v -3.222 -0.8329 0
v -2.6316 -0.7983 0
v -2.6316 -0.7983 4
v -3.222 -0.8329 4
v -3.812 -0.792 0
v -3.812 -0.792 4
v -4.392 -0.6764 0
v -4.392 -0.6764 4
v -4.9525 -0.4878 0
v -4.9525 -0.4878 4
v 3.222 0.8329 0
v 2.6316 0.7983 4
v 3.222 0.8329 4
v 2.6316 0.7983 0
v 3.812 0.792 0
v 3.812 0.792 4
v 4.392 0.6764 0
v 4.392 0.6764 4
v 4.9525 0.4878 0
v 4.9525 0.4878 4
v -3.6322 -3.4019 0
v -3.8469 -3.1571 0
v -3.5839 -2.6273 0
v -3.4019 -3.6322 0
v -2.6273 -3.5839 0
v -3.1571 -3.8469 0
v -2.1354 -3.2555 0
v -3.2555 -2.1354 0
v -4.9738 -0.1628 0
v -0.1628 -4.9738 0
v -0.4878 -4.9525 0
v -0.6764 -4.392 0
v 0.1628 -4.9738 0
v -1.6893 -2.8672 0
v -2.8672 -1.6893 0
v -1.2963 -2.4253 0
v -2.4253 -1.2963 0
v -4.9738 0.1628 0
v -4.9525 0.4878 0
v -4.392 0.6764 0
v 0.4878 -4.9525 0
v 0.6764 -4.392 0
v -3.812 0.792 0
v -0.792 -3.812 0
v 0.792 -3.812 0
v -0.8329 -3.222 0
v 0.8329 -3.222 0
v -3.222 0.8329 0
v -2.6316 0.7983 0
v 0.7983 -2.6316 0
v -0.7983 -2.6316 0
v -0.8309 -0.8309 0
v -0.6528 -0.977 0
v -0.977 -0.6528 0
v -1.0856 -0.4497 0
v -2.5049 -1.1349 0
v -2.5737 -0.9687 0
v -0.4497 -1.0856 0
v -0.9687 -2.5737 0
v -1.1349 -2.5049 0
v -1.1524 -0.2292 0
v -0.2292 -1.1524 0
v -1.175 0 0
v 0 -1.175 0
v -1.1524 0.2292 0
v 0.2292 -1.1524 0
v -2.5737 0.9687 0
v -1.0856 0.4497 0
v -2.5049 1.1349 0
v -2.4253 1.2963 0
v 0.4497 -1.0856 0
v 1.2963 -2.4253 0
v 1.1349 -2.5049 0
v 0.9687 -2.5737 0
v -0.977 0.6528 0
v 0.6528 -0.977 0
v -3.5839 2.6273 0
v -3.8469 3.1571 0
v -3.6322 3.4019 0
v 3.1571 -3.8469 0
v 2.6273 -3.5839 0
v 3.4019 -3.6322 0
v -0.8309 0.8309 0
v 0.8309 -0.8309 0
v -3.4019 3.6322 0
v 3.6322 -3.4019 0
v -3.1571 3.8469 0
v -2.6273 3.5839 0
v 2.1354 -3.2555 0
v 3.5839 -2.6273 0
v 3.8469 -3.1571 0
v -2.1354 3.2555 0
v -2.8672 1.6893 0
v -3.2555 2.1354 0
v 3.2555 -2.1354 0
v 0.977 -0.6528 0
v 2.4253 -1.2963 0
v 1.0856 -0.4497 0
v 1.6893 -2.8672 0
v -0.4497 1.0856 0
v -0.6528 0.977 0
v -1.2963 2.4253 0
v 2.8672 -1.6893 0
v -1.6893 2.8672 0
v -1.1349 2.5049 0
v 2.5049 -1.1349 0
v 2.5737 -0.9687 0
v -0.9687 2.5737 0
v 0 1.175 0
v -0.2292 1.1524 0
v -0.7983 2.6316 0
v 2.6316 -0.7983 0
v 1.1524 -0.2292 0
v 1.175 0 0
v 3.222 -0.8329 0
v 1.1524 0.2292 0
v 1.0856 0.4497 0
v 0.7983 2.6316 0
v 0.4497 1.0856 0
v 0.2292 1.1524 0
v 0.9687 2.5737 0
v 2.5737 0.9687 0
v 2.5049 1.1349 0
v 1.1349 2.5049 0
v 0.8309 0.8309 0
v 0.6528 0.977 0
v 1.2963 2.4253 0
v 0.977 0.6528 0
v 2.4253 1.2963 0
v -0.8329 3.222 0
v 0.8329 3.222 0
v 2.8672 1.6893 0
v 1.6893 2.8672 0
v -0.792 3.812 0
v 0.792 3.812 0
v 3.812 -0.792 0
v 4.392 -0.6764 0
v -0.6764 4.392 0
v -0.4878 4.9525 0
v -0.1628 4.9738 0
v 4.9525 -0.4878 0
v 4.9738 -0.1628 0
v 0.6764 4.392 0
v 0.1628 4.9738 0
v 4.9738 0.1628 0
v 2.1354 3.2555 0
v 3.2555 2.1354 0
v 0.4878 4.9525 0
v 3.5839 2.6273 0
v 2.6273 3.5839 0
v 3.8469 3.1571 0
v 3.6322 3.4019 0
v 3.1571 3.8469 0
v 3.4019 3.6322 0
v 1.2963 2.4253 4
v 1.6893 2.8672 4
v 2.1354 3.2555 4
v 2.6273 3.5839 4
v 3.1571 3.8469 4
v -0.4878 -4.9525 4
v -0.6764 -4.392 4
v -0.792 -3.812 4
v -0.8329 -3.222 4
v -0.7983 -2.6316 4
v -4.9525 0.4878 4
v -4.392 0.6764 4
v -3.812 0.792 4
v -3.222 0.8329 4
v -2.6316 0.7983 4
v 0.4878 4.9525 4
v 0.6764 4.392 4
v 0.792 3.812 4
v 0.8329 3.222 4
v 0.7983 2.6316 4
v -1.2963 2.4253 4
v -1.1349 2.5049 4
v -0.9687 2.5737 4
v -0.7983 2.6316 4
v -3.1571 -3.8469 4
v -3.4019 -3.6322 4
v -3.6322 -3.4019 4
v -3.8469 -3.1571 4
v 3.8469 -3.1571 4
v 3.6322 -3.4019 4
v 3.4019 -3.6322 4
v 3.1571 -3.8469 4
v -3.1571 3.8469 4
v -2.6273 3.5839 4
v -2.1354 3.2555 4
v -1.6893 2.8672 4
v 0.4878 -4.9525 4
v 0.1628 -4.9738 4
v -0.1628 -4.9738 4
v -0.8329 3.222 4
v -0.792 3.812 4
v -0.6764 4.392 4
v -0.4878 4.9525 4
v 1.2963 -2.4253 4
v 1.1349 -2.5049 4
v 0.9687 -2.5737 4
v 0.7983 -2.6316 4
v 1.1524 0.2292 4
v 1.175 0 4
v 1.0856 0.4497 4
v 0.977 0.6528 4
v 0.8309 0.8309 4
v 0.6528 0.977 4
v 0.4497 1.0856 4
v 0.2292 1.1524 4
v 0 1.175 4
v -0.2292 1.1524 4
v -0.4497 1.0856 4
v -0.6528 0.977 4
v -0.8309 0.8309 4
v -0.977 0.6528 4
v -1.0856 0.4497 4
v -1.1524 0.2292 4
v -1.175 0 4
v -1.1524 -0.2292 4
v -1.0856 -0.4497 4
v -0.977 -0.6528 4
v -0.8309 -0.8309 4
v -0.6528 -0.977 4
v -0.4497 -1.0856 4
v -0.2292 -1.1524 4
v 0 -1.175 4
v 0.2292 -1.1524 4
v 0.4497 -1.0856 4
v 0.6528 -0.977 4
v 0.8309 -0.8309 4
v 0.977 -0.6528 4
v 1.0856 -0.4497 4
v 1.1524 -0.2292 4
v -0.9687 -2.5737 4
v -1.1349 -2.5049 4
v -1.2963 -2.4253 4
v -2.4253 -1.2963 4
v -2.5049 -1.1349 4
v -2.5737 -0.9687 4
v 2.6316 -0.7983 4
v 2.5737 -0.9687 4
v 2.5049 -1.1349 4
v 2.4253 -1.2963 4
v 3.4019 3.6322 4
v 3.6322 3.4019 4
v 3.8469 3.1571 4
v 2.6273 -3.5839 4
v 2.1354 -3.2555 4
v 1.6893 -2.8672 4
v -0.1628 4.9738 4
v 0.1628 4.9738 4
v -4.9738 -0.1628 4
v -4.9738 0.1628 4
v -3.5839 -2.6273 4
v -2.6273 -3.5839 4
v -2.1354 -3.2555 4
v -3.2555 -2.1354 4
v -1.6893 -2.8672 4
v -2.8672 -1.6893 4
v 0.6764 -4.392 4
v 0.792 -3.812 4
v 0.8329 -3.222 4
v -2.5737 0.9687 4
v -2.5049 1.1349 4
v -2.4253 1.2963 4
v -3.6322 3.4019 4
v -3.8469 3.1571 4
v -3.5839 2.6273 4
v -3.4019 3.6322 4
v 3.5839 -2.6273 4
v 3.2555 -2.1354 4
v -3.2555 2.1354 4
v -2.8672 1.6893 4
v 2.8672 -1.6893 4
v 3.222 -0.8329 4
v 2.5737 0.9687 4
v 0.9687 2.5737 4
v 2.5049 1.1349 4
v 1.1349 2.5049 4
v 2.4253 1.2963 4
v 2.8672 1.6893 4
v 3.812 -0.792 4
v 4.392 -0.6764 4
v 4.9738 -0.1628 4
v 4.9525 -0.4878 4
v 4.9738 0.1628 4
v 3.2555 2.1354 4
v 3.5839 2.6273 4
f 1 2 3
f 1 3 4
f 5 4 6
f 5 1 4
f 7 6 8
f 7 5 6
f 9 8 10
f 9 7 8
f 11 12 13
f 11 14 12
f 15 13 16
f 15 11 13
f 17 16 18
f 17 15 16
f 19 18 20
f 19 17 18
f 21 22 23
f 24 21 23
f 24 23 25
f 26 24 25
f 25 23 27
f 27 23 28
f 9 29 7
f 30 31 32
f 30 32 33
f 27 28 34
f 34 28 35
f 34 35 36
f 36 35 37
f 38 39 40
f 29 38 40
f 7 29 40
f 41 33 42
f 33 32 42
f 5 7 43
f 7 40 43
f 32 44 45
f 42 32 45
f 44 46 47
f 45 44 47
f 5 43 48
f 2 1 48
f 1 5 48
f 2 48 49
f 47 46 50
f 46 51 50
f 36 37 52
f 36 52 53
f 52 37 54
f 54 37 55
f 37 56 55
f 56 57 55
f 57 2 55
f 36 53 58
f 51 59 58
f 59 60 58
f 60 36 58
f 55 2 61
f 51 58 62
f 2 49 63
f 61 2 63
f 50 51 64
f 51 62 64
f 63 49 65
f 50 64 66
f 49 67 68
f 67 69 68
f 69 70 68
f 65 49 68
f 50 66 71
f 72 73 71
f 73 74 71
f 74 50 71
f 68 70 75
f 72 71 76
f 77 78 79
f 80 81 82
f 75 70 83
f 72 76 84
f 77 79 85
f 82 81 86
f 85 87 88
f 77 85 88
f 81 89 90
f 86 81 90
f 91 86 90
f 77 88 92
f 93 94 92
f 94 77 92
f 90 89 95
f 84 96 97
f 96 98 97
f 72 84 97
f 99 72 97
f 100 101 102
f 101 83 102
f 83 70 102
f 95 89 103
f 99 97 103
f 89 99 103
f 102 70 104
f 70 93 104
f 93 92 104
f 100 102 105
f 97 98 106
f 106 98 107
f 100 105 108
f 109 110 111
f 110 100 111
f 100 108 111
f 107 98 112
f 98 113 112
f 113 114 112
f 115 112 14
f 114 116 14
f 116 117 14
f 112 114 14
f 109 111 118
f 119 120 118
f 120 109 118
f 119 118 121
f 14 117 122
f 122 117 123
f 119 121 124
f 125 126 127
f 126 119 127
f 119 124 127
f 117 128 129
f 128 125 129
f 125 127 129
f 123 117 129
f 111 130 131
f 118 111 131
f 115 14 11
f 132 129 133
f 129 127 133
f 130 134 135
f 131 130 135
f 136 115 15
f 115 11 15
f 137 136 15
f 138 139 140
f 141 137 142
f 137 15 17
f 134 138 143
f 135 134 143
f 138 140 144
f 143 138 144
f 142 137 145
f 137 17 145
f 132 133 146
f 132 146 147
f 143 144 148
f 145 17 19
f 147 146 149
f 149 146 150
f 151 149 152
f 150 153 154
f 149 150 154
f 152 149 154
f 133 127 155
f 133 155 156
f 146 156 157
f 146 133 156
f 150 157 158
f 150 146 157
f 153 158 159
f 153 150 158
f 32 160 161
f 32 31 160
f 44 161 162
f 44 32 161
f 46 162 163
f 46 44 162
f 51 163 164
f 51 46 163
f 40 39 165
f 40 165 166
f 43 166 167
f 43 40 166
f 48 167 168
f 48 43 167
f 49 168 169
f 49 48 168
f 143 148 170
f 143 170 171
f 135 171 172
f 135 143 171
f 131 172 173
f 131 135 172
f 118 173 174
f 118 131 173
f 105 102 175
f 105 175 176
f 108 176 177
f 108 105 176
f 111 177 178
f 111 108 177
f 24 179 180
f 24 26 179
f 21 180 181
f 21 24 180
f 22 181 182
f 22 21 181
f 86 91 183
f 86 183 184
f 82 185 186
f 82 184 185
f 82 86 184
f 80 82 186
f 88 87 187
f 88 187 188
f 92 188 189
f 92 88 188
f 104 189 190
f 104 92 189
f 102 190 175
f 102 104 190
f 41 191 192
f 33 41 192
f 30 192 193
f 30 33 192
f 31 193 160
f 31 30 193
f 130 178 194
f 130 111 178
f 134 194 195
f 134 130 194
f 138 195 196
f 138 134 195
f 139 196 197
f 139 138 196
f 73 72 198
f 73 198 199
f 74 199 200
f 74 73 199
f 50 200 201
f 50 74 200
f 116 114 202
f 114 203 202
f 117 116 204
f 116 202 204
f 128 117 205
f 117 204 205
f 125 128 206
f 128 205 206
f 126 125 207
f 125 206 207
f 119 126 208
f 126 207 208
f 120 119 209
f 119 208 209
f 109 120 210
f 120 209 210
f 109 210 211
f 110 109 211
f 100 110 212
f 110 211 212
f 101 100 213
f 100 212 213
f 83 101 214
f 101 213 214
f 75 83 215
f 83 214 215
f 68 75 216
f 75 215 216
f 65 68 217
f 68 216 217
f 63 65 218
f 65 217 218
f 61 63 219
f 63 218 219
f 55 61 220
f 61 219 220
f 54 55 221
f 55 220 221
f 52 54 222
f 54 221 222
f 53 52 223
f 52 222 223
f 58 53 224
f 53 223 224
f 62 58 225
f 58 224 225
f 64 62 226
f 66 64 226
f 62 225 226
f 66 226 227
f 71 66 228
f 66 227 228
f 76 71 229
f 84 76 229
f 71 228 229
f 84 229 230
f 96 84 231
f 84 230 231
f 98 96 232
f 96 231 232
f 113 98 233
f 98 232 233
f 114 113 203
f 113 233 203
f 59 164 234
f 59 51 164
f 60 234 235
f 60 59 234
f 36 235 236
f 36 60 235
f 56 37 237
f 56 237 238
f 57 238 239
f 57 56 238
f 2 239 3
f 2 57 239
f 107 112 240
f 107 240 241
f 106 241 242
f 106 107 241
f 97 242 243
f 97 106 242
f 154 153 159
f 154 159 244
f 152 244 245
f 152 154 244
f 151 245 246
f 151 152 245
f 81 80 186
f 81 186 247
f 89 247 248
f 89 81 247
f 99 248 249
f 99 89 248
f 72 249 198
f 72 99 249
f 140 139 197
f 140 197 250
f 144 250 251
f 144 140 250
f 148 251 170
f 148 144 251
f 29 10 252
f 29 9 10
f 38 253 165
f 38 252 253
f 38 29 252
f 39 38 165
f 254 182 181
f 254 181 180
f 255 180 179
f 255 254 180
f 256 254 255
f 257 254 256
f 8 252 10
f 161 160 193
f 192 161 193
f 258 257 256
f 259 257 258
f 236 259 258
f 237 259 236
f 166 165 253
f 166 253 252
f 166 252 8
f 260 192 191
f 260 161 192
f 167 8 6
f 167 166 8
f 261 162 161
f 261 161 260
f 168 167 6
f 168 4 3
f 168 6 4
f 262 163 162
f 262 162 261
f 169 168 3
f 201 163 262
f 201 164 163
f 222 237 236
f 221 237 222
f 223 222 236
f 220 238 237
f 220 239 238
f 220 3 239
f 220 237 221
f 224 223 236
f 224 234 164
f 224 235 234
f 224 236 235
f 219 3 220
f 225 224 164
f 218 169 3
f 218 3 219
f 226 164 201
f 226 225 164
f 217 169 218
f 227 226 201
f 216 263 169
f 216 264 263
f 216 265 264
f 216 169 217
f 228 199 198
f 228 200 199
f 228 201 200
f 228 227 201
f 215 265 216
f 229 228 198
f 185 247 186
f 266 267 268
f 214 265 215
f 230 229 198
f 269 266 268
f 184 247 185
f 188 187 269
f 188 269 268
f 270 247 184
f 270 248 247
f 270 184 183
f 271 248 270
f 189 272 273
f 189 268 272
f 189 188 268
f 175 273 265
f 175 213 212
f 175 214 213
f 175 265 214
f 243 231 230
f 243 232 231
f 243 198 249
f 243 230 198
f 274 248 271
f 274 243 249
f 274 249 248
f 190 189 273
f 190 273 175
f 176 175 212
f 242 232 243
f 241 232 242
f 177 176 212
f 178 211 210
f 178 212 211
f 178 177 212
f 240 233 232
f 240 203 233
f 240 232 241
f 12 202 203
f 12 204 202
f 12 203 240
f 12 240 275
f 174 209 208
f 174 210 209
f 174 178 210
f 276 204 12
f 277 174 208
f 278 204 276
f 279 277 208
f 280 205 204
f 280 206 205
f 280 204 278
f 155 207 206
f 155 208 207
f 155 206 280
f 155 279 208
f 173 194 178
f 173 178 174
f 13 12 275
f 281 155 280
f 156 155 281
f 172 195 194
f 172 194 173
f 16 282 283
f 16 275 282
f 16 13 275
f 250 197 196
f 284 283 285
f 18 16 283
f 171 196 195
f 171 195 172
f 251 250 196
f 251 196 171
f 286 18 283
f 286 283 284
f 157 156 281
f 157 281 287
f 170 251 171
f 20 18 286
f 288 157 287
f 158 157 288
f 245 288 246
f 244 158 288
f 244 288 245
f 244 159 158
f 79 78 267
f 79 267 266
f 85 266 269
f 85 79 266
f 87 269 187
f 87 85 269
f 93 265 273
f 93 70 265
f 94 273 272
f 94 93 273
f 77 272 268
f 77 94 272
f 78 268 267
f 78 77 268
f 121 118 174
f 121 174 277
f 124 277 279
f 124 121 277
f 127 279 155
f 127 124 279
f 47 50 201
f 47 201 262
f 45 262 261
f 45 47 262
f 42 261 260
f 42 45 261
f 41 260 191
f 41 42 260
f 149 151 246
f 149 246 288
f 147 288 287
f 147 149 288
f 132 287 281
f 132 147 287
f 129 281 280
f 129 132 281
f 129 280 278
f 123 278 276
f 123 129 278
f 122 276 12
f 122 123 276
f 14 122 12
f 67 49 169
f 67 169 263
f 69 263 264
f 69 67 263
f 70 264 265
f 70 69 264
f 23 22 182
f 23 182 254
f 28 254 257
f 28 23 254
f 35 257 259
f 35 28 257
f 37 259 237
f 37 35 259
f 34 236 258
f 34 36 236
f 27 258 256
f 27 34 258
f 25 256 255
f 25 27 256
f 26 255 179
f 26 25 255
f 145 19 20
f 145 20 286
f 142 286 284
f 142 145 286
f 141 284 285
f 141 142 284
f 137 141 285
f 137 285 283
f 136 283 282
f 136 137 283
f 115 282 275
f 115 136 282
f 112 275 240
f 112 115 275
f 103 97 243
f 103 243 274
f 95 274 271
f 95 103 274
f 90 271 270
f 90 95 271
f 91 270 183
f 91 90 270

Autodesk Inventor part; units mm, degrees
sketch "Sketch1" plane through (0, 0, 0) normal (0, 0, 1) x (1, 0, 0)
  circle A0 centre (0, 0) radius 4.9765
  dimension "d0" = 9.953
extrude "Extrusion1" add sketch "Sketch1" along normal blind 4
ref_plane "Work Plane2" through (0, 0, 2) normal (0, 0, 1) x (1, 0, 0)
sketch "Sketch2" plane through (0, 0, 0) normal (0, 0, -1) x (-1, 0, 0)
  circle A0 centre (0, 0) radius 4.9765 projected
  circle A1 centre (0, 0) radius 4
  dimension "d3" = 8
surface extrude "節圓直徑" sketch "Sketch2" against normal through all shown no curves A1
ref_plane "Work Plane8" through (0, 0, 0) normal (0.9238795, 0.3826834, 0) x (0, 0, 1)
ref_plane "Work Plane9" through (0, 0, 0) normal (1, 0, 0) x (0, 1, 0)
spur gear teeth "正齒輪" teeth 8 pitch diameter 8 tip diameter 9.953 root diameter 5.5 face width 4 start plane through (0, 0, 0) normal (0, 0, -1) x (-1, 0, 0)
sketch "草圖3" plane through (0, 0, 4) normal (0, 0, 1) x (1, 0, 0)
  circle A0 centre (0, 0) radius 1.175
  dimension "d49" = 2.35
extrude "擠出2" cut sketch "草圖3" against normal up to next
equation "\"d0\" = da_da"
equation "\"d1\" = da_b"
equation "\"d3\" = da_d"
equation "\"d16\" = da_aw"
equation "\"d43\" = da_aw"
equation "\"d46\" = da_aw"
equation "\"da_da\" = 9.95296"
equation "\"da_b\" = 4"
equation "\"da_d\" = 8"
equation "\"da_aw\" = 23.624533"
properties part number "正齒輪1" material "Steel"
